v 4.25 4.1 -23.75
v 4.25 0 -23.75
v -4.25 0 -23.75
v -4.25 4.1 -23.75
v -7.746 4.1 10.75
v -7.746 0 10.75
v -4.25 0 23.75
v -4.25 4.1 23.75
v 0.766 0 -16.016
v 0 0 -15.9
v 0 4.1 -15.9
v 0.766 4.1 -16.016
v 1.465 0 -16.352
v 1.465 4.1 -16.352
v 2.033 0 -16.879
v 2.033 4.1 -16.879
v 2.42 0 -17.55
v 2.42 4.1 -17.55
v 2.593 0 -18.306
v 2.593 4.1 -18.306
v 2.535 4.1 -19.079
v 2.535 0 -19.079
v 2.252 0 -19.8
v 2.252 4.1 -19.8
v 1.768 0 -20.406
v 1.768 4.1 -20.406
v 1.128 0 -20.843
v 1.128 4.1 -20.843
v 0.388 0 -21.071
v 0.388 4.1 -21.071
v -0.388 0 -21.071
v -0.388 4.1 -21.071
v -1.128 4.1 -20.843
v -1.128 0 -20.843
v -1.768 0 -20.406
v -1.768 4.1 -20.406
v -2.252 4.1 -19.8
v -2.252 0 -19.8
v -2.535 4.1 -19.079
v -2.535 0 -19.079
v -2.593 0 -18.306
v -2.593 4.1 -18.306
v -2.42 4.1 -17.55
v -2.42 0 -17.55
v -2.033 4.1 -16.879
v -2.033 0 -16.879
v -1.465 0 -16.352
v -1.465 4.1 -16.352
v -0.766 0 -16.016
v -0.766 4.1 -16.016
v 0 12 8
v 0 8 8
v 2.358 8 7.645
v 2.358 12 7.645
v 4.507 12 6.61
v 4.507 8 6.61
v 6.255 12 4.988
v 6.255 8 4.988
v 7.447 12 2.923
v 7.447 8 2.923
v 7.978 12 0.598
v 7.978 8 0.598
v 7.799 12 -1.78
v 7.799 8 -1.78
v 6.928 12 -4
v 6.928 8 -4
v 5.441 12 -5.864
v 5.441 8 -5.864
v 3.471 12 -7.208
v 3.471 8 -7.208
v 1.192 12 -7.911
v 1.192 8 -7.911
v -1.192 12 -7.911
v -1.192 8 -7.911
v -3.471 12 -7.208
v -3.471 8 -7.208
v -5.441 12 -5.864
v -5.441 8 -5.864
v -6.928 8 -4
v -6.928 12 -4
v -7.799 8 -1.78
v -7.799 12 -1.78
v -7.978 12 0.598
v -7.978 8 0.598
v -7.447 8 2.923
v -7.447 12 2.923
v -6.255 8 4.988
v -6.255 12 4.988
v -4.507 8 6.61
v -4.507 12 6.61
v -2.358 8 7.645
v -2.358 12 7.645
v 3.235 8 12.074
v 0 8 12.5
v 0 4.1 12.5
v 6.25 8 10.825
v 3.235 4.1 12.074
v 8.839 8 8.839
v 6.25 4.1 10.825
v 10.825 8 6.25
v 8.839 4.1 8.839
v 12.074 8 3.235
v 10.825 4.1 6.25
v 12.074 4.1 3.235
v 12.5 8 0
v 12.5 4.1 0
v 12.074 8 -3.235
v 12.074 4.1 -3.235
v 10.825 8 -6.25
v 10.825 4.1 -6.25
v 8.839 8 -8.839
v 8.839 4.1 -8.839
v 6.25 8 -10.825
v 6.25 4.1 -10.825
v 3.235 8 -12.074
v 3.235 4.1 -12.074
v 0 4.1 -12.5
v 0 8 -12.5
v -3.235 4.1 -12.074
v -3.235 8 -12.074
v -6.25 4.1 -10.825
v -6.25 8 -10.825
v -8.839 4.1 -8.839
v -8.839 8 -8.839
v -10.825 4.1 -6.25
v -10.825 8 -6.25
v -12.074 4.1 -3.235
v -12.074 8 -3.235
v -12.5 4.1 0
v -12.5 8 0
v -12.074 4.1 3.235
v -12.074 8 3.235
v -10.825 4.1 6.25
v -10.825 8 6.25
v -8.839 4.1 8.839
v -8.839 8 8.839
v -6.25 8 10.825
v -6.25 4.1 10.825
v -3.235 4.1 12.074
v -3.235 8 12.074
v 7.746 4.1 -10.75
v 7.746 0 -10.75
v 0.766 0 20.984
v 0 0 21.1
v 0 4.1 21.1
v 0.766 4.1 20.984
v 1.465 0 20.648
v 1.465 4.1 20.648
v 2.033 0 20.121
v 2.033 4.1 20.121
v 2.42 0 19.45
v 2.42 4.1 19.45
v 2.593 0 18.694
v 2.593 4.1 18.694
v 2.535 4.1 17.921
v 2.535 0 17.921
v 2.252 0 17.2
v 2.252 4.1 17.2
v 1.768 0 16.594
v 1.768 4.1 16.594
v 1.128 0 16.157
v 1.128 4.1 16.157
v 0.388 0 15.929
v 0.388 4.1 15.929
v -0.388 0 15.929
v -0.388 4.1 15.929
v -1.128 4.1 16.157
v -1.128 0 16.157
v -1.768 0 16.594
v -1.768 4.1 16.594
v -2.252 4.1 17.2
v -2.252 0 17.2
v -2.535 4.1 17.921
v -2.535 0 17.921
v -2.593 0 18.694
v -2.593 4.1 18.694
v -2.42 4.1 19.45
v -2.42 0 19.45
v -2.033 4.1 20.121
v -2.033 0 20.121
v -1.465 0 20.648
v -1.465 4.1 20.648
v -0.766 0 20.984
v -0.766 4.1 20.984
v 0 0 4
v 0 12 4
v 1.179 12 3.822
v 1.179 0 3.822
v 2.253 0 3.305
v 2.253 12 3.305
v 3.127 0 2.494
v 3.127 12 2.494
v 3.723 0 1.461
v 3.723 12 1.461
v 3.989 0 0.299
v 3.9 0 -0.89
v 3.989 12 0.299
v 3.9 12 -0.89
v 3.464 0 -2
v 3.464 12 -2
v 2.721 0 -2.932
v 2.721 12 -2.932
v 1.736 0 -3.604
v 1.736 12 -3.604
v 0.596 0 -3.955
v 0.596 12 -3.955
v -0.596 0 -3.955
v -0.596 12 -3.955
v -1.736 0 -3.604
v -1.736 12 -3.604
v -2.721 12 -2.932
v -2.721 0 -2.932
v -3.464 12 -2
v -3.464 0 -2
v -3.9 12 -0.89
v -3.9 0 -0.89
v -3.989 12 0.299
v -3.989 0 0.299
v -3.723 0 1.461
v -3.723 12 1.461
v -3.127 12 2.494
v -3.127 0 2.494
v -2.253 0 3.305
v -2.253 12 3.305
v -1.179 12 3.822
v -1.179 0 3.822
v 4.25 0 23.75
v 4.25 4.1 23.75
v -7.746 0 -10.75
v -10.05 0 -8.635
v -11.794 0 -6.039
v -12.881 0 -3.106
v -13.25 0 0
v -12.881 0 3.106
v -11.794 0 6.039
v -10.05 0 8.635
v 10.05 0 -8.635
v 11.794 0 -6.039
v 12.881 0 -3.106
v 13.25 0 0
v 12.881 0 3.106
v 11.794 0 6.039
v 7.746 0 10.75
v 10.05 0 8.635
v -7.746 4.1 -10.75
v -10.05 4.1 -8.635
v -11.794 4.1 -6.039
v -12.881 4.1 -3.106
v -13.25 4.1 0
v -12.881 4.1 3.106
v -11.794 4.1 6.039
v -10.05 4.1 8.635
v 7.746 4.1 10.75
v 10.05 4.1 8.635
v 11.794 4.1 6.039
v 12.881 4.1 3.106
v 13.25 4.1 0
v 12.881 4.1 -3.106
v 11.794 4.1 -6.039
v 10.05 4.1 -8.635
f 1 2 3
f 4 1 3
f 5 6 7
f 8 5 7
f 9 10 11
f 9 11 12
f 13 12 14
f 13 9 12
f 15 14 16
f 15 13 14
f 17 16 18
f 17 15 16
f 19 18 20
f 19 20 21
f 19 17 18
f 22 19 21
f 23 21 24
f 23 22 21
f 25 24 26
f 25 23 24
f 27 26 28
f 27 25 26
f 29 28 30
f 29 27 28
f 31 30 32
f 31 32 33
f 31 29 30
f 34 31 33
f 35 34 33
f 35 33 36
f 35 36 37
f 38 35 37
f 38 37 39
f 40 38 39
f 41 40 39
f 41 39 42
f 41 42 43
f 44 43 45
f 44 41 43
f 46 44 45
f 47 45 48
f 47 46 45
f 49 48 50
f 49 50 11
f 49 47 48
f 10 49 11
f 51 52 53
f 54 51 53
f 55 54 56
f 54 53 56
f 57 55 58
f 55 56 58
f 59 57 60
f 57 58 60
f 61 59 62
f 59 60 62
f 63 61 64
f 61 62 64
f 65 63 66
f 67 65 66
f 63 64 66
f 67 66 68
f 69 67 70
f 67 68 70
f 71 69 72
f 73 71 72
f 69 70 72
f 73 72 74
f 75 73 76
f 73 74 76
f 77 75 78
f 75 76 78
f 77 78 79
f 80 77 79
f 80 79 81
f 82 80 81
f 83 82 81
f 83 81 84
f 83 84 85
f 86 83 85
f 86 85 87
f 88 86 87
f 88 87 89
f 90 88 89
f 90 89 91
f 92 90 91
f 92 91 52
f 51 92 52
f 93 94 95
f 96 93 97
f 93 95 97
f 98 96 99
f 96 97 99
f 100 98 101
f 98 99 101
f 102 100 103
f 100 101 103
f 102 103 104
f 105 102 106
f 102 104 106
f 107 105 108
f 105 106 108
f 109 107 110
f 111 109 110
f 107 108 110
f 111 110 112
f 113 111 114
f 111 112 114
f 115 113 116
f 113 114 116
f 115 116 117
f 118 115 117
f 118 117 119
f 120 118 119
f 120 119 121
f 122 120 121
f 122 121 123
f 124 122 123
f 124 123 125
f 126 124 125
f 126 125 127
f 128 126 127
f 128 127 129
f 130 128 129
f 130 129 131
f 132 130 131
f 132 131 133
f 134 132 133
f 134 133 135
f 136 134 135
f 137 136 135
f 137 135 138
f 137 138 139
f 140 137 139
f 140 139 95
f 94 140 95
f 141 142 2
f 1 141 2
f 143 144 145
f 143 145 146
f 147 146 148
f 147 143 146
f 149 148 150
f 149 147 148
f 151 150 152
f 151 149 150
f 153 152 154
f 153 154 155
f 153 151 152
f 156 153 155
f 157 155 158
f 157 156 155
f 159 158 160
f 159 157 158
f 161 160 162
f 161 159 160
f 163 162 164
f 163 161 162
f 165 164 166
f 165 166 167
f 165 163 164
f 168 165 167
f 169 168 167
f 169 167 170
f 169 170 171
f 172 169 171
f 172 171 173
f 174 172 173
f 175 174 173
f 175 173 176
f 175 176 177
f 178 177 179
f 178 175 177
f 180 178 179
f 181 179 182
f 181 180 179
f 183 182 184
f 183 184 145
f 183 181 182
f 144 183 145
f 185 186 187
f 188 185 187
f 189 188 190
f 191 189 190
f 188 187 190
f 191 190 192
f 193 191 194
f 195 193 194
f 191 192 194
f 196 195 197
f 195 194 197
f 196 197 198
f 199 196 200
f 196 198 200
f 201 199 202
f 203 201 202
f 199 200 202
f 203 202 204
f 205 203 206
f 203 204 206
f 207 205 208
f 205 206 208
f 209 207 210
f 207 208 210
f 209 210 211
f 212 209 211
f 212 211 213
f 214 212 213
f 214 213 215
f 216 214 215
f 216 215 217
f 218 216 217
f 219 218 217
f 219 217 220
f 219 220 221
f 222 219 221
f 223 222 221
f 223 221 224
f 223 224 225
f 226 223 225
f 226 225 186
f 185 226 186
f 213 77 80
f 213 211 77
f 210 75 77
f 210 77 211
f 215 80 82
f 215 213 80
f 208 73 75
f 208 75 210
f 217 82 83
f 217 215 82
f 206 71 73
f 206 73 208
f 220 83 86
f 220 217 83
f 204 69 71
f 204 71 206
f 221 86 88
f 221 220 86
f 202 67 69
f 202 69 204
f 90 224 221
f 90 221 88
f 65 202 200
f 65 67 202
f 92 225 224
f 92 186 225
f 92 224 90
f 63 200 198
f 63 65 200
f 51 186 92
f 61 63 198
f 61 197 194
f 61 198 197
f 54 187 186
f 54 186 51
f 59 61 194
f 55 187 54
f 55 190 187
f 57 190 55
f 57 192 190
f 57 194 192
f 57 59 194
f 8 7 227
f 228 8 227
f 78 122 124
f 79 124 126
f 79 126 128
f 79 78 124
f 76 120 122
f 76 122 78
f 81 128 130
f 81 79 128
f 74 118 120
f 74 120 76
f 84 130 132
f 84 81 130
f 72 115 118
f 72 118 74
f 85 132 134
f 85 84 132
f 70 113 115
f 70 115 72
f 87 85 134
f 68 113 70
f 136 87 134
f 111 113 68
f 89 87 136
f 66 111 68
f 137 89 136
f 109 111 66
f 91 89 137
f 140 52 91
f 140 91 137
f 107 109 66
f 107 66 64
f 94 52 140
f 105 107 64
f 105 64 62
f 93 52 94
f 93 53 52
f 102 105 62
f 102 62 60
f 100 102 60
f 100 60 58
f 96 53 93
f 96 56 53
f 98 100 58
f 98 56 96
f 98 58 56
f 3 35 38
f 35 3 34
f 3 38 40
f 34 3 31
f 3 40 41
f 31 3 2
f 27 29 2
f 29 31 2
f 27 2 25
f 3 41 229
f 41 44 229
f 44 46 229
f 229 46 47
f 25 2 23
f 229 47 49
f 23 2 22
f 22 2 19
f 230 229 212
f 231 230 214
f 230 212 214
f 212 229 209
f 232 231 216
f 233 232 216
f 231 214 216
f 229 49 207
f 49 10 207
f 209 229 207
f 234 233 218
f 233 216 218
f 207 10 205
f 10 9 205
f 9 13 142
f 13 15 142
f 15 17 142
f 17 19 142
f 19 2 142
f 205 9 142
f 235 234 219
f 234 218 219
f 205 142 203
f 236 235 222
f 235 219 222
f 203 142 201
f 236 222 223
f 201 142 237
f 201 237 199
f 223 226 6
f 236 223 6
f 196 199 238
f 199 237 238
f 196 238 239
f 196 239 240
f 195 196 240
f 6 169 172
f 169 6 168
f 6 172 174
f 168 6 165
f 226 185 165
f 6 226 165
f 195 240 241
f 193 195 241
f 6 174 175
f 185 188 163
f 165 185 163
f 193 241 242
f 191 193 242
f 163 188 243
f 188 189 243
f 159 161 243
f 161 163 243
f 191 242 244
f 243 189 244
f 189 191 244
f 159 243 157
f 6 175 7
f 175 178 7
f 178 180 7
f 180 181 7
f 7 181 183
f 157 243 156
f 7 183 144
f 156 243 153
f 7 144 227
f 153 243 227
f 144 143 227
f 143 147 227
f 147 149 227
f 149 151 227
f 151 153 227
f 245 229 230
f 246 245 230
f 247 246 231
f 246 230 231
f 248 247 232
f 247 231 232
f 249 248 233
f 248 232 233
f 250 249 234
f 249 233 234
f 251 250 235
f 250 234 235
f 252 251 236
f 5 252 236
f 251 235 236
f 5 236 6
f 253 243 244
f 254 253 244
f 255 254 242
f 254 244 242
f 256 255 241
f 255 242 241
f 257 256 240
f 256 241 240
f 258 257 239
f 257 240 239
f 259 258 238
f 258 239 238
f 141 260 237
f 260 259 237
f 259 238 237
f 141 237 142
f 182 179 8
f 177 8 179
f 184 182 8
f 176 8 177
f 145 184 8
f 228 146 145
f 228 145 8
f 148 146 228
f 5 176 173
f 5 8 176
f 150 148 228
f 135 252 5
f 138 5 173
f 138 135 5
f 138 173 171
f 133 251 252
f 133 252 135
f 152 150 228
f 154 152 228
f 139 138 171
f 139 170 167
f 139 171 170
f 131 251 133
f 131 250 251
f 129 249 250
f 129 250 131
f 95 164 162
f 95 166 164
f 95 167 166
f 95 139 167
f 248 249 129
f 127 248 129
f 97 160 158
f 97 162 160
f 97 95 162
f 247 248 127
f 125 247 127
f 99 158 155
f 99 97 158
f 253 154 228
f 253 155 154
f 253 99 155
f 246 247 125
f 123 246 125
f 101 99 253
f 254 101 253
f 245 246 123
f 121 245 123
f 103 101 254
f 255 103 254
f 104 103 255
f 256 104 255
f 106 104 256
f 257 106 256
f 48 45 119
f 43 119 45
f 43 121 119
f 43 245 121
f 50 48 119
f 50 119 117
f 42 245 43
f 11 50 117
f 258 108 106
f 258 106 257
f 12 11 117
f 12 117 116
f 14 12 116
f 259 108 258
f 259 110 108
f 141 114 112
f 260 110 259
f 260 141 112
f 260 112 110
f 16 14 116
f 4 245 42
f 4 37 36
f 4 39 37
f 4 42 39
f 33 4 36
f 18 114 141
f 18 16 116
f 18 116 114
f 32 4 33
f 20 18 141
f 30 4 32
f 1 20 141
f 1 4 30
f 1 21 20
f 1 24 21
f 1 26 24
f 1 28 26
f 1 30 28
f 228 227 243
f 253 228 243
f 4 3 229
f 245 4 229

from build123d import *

# Parameters (mm, degrees)
SKETCH1_R                = 13.25
SKETCH1_R_2              = 2.6
BOSS_EXTRUDE1_DEPTH      = 4.1
BOSS_EXTRUDE2_DEPTH      = 3.9
BOSS_EXTRUDE2_DEPTH_BACK = 4.1
SKETCH2_R                = 12.5
BOSS_EXTRUDE3_DEPTH      = 4
BOSS_EXTRUDE3_DEPTH_BACK = 3.9
SKETCH3_R                = 8
SKETCH4_R                = 4
CUT_EXTRUDE1_DEPTH       = 30.725830518


with BuildPart() as part:
    # Sketch1 → Boss-Extrude1 (new body)
    # profile 1 of 3: a face of its own
    with BuildSketch(Plane(origin=(0, 0, 0), x_dir=(1, 0, 0), z_dir=(0, 1, 0))):
        Circle(SKETCH1_R)
    # profile 2 of 3: a face of its own
    with BuildSketch(Plane(origin=(0, 0, 0), x_dir=(1, 0, 0), z_dir=(0, 1, 0))):
        with BuildLine():
            Line((7.745966692, 10.75), (4.25, 23.75))
            Line((4.25, 23.75), (-4.25, 23.75))
            Line((-4.25, 23.75), (-7.745966692, 10.75))
            ThreePointArc((-7.745966692, 10.75), (0, 13.25), (7.745966692, 10.75))
        make_face()
        with Locations(Location((0, 18.5, 0), (0, 0, 270))):
            Circle(SKETCH1_R_2, mode=Mode.SUBTRACT)
    # profile 3 of 3: a face of its own
    with BuildSketch(Plane(origin=(0, 0, 0), x_dir=(1, 0, 0), z_dir=(0, 1, 0))):
        with BuildLine():
            Line((4.25, -23.75), (7.745966692, -10.75))
            ThreePointArc((7.745966692, -10.75), (0, -13.25), (-7.745966692, -10.75))
            Line((-7.745966692, -10.75), (-4.25, -23.75))
            Line((-4.25, -23.75), (4.25, -23.75))
        make_face()
        with Locations(Location((0, -18.5, 0), (0, 0, 270))):
            Circle(SKETCH1_R_2, mode=Mode.SUBTRACT)
    extrude(amount=BOSS_EXTRUDE1_DEPTH)

    # Sketch2 → Boss-Extrude2 (add, two sides: drawn at the far end of the back side and taken through both)
    with BuildSketch(Plane(origin=(0, 4.1, 0), x_dir=(1, 0, 0), z_dir=(0, 1, 0)).offset(-BOSS_EXTRUDE2_DEPTH_BACK)):
        with Locations(Location((0, 0, 0), (0, 0, 270))):
            Circle(SKETCH2_R)
    extrude(amount=BOSS_EXTRUDE2_DEPTH + BOSS_EXTRUDE2_DEPTH_BACK)

    # Sketch3 → Boss-Extrude3 (add, two sides: drawn at the far end of the back side and taken through both)
    with BuildSketch(Plane(origin=(0, 8, 0), x_dir=(1, 0, 0), z_dir=(0, 1, 0)).offset(-BOSS_EXTRUDE3_DEPTH_BACK)):
        with Locations(Location((0, 0, 0), (0, 0, 270))):
            Circle(SKETCH3_R)
    extrude(amount=BOSS_EXTRUDE3_DEPTH + BOSS_EXTRUDE3_DEPTH_BACK)

    # Sketch4 → Cut-Extrude1 (cut, through all)
    with BuildSketch(Plane(origin=(0, 12, 0), x_dir=(1, 0, 0), z_dir=(0, 1, 0))):
        with Locations(Location((0, 0, 0), (0, 0, 270))):
            Circle(SKETCH4_R)
    extrude(amount=-CUT_EXTRUDE1_DEPTH, mode=Mode.SUBTRACT)


solid = part.part
